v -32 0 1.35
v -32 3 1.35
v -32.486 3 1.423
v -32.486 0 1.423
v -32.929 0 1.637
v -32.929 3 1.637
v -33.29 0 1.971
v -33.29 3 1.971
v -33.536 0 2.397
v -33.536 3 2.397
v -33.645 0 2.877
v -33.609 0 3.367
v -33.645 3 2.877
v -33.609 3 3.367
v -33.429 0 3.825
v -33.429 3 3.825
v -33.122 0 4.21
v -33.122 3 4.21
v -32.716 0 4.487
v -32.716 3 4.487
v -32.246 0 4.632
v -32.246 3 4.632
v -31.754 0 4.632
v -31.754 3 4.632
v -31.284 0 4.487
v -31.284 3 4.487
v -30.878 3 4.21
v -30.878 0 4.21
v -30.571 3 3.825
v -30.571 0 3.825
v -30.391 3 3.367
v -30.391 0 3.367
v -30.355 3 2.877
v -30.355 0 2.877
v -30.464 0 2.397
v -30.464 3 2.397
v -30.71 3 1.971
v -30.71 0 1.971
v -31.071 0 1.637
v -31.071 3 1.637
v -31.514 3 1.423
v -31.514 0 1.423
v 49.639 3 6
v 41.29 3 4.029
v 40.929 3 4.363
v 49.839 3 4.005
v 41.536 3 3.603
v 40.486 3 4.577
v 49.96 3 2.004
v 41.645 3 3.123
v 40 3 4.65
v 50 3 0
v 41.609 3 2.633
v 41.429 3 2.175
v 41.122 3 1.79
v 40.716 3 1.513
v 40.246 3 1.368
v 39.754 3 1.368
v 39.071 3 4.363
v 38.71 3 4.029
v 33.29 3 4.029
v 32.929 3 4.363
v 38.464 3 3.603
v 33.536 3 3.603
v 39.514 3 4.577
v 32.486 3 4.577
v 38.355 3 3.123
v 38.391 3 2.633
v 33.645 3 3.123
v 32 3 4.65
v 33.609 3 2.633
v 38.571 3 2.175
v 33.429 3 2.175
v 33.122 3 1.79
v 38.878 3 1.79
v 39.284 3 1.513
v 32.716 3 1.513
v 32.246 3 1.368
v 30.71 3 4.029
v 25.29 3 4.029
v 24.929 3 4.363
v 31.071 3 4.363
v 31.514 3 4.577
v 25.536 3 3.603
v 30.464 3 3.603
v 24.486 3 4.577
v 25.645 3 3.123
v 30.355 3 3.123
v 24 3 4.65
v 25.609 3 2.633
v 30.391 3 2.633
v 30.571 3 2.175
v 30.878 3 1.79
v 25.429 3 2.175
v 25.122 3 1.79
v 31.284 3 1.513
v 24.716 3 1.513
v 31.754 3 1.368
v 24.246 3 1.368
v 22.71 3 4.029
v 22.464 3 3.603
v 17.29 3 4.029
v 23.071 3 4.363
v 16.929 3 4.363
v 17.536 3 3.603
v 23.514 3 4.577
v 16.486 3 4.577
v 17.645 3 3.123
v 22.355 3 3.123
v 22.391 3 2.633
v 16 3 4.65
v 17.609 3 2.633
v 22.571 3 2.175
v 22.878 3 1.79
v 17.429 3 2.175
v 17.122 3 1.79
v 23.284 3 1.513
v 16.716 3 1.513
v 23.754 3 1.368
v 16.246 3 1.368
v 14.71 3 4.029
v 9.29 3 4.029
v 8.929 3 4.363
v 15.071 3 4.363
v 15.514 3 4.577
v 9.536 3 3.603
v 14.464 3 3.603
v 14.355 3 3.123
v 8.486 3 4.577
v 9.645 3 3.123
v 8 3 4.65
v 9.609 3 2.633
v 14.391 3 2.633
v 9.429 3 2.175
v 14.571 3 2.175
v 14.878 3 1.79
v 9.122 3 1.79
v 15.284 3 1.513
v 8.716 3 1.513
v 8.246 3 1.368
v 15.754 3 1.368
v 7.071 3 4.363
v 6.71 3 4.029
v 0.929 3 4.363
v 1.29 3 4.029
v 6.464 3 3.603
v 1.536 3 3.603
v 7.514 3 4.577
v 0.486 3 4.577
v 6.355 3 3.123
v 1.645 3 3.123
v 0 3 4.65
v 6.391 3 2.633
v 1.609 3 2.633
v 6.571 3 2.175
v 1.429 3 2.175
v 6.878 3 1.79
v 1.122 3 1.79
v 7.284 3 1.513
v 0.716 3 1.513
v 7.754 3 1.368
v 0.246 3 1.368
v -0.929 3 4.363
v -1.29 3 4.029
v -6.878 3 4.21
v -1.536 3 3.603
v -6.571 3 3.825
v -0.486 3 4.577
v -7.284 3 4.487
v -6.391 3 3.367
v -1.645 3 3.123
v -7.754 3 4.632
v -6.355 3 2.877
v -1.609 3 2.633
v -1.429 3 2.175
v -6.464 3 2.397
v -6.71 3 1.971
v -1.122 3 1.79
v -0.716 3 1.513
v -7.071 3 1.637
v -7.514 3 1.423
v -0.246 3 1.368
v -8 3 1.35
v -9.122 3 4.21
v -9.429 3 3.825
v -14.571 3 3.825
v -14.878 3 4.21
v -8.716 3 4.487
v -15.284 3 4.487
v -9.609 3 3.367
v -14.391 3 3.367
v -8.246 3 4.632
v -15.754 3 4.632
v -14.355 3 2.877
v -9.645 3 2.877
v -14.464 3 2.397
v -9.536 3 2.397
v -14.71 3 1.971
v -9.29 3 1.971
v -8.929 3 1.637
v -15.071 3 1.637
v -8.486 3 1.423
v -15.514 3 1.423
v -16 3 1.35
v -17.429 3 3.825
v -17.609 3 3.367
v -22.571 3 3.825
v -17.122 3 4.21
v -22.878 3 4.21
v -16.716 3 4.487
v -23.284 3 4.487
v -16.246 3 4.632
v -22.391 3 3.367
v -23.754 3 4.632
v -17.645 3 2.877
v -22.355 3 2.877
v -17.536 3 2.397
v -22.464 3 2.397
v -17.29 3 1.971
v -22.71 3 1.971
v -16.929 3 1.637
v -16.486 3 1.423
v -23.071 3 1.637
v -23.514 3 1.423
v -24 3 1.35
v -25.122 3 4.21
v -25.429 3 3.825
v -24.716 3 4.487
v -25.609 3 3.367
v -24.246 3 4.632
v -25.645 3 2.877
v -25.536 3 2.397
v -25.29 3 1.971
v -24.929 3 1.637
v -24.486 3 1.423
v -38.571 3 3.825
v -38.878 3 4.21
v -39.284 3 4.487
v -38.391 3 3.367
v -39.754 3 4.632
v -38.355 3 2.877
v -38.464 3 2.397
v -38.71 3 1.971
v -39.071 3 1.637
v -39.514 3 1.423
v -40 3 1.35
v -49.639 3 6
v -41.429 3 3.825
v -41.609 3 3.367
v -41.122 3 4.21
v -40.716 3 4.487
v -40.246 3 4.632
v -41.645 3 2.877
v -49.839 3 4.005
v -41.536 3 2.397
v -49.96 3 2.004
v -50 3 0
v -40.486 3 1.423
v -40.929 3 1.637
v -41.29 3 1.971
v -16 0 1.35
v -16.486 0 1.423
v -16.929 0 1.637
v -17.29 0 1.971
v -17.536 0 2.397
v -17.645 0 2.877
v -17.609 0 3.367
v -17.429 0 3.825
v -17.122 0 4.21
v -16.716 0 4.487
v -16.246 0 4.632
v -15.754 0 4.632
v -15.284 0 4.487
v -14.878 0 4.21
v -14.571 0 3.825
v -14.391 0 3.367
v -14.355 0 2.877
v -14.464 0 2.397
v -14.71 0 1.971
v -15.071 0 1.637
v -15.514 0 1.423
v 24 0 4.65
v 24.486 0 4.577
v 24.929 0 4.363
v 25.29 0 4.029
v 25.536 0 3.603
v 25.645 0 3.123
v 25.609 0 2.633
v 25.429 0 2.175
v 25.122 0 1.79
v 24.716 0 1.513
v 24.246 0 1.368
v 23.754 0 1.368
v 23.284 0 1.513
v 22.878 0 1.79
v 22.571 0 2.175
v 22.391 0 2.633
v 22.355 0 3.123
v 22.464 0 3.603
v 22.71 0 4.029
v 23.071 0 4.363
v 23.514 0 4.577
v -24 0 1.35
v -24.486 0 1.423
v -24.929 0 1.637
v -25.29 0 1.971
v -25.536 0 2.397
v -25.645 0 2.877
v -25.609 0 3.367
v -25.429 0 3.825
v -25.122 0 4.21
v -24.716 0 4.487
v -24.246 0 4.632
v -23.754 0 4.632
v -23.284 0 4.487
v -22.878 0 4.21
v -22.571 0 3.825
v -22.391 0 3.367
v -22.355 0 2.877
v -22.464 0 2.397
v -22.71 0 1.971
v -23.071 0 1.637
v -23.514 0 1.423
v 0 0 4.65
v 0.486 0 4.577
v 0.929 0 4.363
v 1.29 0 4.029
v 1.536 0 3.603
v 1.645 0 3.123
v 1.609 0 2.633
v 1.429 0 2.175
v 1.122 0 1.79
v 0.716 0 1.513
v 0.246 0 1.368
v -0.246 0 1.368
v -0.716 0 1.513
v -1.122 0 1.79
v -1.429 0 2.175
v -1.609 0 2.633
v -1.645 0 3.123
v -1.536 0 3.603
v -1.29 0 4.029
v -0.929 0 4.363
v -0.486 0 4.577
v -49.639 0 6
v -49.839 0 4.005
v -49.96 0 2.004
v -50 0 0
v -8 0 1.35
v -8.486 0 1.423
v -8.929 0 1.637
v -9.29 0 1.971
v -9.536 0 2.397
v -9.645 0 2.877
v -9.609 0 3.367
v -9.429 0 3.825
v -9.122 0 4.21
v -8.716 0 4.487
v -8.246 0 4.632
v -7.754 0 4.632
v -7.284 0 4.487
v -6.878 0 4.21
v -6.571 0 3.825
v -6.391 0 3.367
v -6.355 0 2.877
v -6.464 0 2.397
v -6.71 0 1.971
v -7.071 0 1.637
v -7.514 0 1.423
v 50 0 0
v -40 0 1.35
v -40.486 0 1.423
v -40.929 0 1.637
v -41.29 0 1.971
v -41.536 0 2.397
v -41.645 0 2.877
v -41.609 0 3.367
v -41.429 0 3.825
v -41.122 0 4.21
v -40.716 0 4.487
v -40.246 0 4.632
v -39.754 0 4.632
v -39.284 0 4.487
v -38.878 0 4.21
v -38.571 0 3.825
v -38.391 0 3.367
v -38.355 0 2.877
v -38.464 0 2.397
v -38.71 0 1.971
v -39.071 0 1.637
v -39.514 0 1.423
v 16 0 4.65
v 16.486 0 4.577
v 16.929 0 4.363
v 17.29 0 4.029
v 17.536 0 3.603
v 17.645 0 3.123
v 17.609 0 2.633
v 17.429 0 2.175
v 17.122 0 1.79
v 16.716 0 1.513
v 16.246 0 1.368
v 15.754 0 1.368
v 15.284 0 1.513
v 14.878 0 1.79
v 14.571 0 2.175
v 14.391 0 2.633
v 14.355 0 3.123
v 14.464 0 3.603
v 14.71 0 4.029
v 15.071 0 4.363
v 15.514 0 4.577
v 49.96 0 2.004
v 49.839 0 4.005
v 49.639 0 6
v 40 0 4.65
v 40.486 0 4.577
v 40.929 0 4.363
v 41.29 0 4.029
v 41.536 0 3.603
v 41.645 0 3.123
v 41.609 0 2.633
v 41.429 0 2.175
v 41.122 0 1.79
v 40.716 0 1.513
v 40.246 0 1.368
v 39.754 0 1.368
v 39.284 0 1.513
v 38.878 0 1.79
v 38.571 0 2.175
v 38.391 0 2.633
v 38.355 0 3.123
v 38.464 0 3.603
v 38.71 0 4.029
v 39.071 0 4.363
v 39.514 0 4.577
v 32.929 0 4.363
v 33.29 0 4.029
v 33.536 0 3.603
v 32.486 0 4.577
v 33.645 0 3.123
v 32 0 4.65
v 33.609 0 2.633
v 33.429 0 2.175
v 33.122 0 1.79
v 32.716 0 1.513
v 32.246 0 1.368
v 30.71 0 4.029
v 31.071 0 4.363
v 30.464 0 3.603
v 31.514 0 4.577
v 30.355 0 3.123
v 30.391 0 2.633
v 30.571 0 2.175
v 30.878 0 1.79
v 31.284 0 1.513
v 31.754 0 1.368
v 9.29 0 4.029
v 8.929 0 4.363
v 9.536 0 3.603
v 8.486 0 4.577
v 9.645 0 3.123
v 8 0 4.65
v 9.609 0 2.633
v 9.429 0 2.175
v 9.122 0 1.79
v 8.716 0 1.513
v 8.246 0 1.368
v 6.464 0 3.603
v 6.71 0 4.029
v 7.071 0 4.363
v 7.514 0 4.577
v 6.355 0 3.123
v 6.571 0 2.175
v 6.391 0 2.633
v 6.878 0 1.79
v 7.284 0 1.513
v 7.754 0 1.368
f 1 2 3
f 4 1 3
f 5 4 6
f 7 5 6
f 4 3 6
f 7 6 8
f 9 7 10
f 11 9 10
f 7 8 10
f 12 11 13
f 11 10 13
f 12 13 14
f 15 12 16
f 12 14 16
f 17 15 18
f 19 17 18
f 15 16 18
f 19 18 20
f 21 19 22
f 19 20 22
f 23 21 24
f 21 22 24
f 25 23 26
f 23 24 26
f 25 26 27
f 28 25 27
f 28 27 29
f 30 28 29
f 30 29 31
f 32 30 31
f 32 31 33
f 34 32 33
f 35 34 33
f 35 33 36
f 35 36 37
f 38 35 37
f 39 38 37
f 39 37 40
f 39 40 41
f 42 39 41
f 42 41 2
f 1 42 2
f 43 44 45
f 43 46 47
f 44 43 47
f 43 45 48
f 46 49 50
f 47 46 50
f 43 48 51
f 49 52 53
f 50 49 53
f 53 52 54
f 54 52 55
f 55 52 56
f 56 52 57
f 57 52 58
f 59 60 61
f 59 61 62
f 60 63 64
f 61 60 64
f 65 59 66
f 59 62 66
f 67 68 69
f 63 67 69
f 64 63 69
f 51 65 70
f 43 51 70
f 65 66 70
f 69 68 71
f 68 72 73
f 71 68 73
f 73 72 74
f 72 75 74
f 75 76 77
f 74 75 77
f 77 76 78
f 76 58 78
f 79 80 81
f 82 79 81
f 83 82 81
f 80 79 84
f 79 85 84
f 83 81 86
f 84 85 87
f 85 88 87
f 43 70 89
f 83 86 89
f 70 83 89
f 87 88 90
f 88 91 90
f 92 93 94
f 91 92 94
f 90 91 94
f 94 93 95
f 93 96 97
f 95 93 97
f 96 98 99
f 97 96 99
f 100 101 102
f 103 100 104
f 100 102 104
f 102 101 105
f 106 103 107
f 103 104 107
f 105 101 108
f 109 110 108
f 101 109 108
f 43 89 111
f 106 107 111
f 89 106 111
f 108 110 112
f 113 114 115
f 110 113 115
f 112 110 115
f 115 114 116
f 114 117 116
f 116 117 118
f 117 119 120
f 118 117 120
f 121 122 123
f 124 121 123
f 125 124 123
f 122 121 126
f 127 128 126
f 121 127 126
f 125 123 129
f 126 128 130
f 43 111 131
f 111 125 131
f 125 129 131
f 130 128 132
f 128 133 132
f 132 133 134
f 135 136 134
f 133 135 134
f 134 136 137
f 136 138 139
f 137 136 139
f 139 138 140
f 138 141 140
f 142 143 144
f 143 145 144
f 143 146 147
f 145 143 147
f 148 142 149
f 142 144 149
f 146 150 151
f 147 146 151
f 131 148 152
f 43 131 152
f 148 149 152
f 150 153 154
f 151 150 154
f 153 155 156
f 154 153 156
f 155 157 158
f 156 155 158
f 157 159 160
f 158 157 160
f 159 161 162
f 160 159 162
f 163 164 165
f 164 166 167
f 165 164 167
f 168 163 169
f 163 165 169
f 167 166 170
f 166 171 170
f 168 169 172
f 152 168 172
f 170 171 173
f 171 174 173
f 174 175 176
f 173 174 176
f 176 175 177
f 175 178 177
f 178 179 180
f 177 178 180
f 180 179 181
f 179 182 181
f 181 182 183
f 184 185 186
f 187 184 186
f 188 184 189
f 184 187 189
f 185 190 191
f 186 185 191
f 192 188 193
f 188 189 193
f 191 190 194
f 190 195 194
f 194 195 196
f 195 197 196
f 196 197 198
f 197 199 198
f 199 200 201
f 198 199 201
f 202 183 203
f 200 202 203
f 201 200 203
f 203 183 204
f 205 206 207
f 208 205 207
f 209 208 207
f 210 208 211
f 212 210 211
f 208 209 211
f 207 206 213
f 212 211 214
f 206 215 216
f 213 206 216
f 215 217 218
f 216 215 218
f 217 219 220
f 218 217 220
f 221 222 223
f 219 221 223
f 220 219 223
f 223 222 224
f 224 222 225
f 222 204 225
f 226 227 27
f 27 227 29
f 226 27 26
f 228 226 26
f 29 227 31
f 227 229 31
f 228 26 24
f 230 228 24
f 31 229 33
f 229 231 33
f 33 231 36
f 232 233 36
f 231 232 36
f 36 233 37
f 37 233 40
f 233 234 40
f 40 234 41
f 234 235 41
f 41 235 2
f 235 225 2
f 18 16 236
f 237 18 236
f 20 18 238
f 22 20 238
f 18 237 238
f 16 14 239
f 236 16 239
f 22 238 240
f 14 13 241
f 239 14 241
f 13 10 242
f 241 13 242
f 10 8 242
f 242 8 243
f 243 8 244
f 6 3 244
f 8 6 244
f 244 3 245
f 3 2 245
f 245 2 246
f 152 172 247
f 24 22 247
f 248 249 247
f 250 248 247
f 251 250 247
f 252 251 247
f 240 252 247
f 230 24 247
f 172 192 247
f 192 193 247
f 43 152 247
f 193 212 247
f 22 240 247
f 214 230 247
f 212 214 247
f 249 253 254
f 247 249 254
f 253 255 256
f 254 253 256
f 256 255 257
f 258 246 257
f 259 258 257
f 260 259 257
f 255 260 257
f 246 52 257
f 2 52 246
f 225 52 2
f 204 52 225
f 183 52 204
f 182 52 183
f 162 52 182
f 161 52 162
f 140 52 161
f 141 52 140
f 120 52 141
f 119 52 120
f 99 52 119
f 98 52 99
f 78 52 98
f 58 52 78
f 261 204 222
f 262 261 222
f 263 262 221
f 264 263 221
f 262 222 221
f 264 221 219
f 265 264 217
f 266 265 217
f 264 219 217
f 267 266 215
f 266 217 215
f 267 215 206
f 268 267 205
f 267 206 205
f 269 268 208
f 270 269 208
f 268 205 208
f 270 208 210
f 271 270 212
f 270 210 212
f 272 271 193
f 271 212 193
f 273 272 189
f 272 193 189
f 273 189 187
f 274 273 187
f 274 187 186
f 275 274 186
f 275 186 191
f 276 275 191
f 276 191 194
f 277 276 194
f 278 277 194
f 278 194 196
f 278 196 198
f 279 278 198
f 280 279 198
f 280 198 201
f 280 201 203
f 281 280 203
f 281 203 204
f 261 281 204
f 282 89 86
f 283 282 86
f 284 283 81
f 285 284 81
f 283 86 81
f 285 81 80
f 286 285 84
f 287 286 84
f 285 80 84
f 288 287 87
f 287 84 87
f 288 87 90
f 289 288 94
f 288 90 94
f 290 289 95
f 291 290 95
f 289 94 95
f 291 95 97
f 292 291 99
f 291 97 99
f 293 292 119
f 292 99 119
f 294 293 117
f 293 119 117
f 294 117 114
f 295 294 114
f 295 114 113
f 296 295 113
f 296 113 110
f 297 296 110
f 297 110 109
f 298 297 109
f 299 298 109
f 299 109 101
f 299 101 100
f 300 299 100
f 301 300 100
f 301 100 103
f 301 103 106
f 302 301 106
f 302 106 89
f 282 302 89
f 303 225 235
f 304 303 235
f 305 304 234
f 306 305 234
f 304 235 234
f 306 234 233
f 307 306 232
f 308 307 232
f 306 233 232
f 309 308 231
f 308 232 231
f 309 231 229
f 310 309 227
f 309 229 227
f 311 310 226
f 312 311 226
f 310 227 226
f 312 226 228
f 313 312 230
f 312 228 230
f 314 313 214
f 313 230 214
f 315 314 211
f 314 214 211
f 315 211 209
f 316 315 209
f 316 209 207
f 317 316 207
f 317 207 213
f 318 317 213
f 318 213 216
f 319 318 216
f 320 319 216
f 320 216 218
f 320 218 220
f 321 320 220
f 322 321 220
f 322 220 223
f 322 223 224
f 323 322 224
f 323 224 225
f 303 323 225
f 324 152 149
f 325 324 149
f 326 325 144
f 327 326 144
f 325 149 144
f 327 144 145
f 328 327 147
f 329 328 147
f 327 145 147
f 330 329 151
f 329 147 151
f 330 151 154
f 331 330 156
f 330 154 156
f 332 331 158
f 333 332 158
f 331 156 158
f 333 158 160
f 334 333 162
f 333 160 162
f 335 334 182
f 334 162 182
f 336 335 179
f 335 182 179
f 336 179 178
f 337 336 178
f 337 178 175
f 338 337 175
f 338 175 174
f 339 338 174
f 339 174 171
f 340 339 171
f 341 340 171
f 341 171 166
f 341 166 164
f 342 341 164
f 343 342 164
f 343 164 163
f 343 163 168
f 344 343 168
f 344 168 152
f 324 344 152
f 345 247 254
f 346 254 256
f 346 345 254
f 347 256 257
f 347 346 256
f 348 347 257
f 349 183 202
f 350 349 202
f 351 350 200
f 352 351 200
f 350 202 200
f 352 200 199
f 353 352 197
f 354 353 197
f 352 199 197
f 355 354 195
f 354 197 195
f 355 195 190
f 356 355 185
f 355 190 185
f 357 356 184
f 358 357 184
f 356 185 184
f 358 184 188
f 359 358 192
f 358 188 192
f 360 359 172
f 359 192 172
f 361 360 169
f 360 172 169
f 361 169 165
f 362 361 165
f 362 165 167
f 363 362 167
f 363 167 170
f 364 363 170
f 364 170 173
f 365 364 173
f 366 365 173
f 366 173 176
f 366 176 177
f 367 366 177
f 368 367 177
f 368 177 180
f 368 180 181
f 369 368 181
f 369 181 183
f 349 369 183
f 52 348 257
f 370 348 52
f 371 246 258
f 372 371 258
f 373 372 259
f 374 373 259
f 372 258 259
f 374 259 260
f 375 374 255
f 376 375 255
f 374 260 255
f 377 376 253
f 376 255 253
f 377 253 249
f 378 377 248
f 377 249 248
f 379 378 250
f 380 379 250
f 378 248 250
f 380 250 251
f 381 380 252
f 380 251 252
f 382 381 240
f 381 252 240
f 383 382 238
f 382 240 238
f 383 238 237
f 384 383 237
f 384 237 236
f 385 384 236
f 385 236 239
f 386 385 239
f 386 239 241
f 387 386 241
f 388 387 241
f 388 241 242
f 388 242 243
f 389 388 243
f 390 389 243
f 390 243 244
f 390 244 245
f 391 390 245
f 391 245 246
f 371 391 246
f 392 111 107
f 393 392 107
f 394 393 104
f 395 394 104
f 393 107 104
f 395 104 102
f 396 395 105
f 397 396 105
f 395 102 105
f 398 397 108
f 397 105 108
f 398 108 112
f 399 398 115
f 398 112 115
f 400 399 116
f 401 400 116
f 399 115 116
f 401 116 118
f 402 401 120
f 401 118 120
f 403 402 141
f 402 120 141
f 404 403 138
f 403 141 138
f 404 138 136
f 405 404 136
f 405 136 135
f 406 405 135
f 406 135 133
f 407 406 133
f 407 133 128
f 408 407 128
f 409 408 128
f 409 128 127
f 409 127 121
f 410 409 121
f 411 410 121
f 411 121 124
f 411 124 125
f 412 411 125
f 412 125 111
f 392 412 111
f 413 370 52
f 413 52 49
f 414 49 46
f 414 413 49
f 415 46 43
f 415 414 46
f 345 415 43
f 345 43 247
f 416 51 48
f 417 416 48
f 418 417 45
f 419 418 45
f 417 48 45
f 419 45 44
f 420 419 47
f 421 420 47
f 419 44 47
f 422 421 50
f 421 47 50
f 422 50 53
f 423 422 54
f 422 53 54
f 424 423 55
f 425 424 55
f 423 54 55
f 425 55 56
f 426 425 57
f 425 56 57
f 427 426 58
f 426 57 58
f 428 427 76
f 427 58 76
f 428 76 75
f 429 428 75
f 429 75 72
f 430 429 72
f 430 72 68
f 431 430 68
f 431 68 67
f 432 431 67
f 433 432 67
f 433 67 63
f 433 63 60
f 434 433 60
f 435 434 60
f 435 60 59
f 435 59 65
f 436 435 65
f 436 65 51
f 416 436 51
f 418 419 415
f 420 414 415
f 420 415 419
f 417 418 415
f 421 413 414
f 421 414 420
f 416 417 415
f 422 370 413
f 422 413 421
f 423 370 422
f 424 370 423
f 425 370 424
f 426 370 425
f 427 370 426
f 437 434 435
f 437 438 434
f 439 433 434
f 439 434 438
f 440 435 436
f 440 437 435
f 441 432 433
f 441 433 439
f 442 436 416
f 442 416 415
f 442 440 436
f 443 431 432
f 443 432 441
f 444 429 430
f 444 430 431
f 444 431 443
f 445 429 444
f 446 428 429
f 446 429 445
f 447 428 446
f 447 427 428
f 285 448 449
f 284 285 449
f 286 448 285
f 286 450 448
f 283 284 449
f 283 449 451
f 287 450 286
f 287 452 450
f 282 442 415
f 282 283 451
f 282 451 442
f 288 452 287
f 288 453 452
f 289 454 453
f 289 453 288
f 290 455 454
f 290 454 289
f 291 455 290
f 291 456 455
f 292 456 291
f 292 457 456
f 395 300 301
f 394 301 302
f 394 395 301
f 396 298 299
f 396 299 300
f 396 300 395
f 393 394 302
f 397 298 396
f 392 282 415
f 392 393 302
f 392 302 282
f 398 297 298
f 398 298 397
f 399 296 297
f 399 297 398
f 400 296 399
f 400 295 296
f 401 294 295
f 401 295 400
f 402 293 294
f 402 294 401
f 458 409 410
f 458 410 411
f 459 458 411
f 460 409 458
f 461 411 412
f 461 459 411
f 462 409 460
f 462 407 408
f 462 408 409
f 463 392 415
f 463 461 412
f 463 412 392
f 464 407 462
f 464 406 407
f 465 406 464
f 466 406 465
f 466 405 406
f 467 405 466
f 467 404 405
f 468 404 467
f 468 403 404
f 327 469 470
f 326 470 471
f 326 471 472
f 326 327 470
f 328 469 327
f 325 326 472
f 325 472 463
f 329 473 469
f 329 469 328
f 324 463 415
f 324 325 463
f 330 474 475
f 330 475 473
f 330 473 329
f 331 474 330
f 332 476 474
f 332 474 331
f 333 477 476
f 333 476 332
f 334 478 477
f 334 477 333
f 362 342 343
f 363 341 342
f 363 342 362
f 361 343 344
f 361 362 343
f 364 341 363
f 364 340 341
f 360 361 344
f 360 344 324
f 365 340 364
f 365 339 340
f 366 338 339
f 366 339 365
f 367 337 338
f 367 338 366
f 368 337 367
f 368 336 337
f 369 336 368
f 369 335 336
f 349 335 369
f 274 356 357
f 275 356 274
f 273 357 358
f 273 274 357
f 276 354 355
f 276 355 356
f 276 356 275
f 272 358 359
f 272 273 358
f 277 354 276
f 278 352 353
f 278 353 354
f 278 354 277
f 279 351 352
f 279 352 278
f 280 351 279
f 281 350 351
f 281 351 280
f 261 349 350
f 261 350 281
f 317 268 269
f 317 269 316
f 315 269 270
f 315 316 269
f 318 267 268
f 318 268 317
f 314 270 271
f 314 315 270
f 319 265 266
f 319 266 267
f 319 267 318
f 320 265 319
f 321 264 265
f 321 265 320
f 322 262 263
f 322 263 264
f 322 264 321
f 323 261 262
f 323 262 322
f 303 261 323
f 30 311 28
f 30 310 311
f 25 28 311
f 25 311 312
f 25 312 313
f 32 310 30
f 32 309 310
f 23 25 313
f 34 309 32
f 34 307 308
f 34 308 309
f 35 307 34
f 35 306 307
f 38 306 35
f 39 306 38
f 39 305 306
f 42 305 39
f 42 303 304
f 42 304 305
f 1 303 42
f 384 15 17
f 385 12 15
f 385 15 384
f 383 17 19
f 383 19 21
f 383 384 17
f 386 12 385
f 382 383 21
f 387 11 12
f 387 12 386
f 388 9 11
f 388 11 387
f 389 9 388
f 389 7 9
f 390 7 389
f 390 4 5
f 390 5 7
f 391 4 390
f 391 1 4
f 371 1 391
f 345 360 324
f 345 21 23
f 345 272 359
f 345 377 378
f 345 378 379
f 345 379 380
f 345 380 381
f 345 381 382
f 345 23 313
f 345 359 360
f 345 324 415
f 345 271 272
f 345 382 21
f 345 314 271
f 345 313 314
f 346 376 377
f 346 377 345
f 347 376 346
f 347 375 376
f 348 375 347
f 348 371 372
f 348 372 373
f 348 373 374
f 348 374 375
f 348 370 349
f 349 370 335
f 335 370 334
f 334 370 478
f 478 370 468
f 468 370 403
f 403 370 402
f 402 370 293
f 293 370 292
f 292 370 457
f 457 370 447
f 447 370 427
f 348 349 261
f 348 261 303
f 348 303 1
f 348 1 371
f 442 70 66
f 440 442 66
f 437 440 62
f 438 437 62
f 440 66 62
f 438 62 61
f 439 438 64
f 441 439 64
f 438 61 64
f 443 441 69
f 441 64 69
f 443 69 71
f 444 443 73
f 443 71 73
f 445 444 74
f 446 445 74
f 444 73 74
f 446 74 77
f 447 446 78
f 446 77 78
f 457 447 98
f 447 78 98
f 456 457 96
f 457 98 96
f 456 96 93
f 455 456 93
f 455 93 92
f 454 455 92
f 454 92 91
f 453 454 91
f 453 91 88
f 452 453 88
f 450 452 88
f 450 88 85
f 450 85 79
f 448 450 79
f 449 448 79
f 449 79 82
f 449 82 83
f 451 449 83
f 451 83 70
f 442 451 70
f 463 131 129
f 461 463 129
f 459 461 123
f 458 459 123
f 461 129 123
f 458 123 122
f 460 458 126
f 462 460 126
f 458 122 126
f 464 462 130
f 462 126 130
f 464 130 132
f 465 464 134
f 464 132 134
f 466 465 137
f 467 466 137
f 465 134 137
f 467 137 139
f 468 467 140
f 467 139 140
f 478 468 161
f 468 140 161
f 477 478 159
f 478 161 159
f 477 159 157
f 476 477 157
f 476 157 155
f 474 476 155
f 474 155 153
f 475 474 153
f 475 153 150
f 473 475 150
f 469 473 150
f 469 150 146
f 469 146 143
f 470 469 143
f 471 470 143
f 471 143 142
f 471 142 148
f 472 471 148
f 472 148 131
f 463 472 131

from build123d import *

# Parameters (mm, degrees)
EXTRUDE_1_DEPTH     = 4
CUT_EXTRUDE_1_DEPTH = 10
SKETCH_3_R          = 2.25
CUT_EXTRUDE_2_DEPTH = 10
SKETCH_4_R          = 1.65
CUT_EXTRUDE_3_DEPTH = 10
SKETCH_5_R          = 2.25
SKETCH_5_W          = 40
SKETCH_5_H          = 20
CUT_EXTRUDE_4_DEPTH = 10
CUT_EXTRUDE_6_DEPTH = 10
CUT_EXTRUDE_START   = -10
CUT_EXTRUDE_7_DEPTH = 10


with BuildPart() as part:
    # 草图1 → 凸台-拉伸1 (new body)
    with BuildSketch(Plane(origin=(0, 0, 0), x_dir=(1, 0, 0), z_dir=(0, 1, 0))):
        with BuildLine():
            Line((-50, 0), (50, 0))
            ThreePointArc((50, 0), (0, -50), (-50, 0))
        make_face()
    extrude(amount=EXTRUDE_1_DEPTH)

    # 草图2 → 切除-拉伸1 (cut)
    with BuildSketch(Plane(origin=(0, 4, 0), x_dir=(1, 0, 0), z_dir=(0, 1, 0))):
        Polygon((0, -10.623043888), (10, -10.623043888), (10, -30.623043888), (-30, -30.623043888), (-30, -10.623043888), align=None)
    extrude(amount=-CUT_EXTRUDE_1_DEPTH, mode=Mode.SUBTRACT)

    # 草图3 → 切除-拉伸2 (cut)
    with BuildSketch(Plane(origin=(0, 4, 0), x_dir=(1, 0, 0), z_dir=(0, 1, 0))):
        with Locations(Location((-34.75, -15.623043888, 0), (0, 0, 270))):
            Circle(SKETCH_3_R)
        with Locations(Location((-34.75, -25.623043888, 0), (0, 0, 270))):
            Circle(SKETCH_3_R)
        with Locations(Location((14.75, -25.623043888, 0), (0, 0, 90))):
            Circle(SKETCH_3_R)
        with Locations(Location((14.75, -15.623043888, 0), (0, 0, 90))):
            Circle(SKETCH_3_R)
    extrude(amount=-CUT_EXTRUDE_2_DEPTH, mode=Mode.SUBTRACT)

    # 草图4 → 切除-拉伸3 (cut)
    with BuildSketch(Plane(origin=(0, 4, 0), x_dir=(1, 0, 0), z_dir=(0, 1, 0))):
        with Locations(Location((0, -3, 0), (0, 0, 270))):
            Circle(SKETCH_4_R)
        with Locations(Location((8, -3, 0), (0, 0, 270))):
            Circle(SKETCH_4_R)
        with Locations(Location((16, -3, 0), (0, 0, 270))):
            Circle(SKETCH_4_R)
        with Locations(Location((24, -3, 0), (0, 0, 270))):
            Circle(SKETCH_4_R)
        with Locations(Location((32, -3, 0), (0, 0, 270))):
            Circle(SKETCH_4_R)
        with Locations(Location((40, -3, 0), (0, 0, 270))):
            Circle(SKETCH_4_R)
        with Locations(Location((-40, -3, 0), (0, 0, 90))):
            Circle(SKETCH_4_R)
        with Locations(Location((-32, -3, 0), (0, 0, 90))):
            Circle(SKETCH_4_R)
        with Locations(Location((-24, -3, 0), (0, 0, 90))):
            Circle(SKETCH_4_R)
        with Locations(Location((-16, -3, 0), (0, 0, 90))):
            Circle(SKETCH_4_R)
        with Locations(Location((-8, -3, 0), (0, 0, 90))):
            Circle(SKETCH_4_R)
    extrude(amount=-CUT_EXTRUDE_3_DEPTH, mode=Mode.SUBTRACT)

    # 草图5 → 切除-拉伸4 (cut)
    with BuildSketch(Plane(origin=(0, 4, 0), x_dir=(1, 0, 0), z_dir=(0, 1, 0))):
        with BuildLine():
            Line((49.355850717, -8), (0, -8))
            Line((0, -8), (-49.355850717, -8))
            ThreePointArc((-49.355850717, -8), (0, -50), (49.355850717, -8))
        make_face()
        with Locations((-34.75, -25.623043888)):
            Circle(SKETCH_5_R, mode=Mode.SUBTRACT)
        with Locations((-10, -20.623043888)):
            Rectangle(SKETCH_5_W, SKETCH_5_H, mode=Mode.SUBTRACT)
        with Locations((-34.75, -15.623043888)):
            Circle(SKETCH_5_R, mode=Mode.SUBTRACT)
        with Locations((14.75, -25.623043888)):
            Circle(SKETCH_5_R, mode=Mode.SUBTRACT)
        with Locations((14.75, -15.623043888)):
            Circle(SKETCH_5_R, mode=Mode.SUBTRACT)
    extrude(amount=-CUT_EXTRUDE_4_DEPTH, mode=Mode.SUBTRACT)

    # 草图7 → 切除-拉伸6 (cut)
    with BuildSketch(Plane(origin=(0, 0, 0), x_dir=(-1, 0, 0), z_dir=(0, 0, -1))):
        Polygon((-50, 4), (-50, 3), (50, 3), (50, 4), (49.677925359, 4), align=None)
    extrude(amount=-CUT_EXTRUDE_6_DEPTH, mode=Mode.SUBTRACT)

    # 草图8 → 切除-拉伸7 (cut)
    with BuildSketch(Plane(origin=(0, 3, 0), x_dir=(1, 0, 0), z_dir=(0, 1, 0)).offset(CUT_EXTRUDE_START)):
        with BuildLine():
            Line((49.638694584, -6), (0, -6))
            Line((0, -6), (-49.638694584, -6))
            ThreePointArc((-49.638694584, -6), (-49.507373187, -7.001428437), (-49.355850717, -8))
            Line((-49.355850717, -8), (49.355850717, -8))
            ThreePointArc((49.355850717, -8), (49.507373187, -7.001428437), (49.638694584, -6))
        make_face()
    extrude(amount=CUT_EXTRUDE_7_DEPTH, mode=Mode.SUBTRACT)


solid = part.part
